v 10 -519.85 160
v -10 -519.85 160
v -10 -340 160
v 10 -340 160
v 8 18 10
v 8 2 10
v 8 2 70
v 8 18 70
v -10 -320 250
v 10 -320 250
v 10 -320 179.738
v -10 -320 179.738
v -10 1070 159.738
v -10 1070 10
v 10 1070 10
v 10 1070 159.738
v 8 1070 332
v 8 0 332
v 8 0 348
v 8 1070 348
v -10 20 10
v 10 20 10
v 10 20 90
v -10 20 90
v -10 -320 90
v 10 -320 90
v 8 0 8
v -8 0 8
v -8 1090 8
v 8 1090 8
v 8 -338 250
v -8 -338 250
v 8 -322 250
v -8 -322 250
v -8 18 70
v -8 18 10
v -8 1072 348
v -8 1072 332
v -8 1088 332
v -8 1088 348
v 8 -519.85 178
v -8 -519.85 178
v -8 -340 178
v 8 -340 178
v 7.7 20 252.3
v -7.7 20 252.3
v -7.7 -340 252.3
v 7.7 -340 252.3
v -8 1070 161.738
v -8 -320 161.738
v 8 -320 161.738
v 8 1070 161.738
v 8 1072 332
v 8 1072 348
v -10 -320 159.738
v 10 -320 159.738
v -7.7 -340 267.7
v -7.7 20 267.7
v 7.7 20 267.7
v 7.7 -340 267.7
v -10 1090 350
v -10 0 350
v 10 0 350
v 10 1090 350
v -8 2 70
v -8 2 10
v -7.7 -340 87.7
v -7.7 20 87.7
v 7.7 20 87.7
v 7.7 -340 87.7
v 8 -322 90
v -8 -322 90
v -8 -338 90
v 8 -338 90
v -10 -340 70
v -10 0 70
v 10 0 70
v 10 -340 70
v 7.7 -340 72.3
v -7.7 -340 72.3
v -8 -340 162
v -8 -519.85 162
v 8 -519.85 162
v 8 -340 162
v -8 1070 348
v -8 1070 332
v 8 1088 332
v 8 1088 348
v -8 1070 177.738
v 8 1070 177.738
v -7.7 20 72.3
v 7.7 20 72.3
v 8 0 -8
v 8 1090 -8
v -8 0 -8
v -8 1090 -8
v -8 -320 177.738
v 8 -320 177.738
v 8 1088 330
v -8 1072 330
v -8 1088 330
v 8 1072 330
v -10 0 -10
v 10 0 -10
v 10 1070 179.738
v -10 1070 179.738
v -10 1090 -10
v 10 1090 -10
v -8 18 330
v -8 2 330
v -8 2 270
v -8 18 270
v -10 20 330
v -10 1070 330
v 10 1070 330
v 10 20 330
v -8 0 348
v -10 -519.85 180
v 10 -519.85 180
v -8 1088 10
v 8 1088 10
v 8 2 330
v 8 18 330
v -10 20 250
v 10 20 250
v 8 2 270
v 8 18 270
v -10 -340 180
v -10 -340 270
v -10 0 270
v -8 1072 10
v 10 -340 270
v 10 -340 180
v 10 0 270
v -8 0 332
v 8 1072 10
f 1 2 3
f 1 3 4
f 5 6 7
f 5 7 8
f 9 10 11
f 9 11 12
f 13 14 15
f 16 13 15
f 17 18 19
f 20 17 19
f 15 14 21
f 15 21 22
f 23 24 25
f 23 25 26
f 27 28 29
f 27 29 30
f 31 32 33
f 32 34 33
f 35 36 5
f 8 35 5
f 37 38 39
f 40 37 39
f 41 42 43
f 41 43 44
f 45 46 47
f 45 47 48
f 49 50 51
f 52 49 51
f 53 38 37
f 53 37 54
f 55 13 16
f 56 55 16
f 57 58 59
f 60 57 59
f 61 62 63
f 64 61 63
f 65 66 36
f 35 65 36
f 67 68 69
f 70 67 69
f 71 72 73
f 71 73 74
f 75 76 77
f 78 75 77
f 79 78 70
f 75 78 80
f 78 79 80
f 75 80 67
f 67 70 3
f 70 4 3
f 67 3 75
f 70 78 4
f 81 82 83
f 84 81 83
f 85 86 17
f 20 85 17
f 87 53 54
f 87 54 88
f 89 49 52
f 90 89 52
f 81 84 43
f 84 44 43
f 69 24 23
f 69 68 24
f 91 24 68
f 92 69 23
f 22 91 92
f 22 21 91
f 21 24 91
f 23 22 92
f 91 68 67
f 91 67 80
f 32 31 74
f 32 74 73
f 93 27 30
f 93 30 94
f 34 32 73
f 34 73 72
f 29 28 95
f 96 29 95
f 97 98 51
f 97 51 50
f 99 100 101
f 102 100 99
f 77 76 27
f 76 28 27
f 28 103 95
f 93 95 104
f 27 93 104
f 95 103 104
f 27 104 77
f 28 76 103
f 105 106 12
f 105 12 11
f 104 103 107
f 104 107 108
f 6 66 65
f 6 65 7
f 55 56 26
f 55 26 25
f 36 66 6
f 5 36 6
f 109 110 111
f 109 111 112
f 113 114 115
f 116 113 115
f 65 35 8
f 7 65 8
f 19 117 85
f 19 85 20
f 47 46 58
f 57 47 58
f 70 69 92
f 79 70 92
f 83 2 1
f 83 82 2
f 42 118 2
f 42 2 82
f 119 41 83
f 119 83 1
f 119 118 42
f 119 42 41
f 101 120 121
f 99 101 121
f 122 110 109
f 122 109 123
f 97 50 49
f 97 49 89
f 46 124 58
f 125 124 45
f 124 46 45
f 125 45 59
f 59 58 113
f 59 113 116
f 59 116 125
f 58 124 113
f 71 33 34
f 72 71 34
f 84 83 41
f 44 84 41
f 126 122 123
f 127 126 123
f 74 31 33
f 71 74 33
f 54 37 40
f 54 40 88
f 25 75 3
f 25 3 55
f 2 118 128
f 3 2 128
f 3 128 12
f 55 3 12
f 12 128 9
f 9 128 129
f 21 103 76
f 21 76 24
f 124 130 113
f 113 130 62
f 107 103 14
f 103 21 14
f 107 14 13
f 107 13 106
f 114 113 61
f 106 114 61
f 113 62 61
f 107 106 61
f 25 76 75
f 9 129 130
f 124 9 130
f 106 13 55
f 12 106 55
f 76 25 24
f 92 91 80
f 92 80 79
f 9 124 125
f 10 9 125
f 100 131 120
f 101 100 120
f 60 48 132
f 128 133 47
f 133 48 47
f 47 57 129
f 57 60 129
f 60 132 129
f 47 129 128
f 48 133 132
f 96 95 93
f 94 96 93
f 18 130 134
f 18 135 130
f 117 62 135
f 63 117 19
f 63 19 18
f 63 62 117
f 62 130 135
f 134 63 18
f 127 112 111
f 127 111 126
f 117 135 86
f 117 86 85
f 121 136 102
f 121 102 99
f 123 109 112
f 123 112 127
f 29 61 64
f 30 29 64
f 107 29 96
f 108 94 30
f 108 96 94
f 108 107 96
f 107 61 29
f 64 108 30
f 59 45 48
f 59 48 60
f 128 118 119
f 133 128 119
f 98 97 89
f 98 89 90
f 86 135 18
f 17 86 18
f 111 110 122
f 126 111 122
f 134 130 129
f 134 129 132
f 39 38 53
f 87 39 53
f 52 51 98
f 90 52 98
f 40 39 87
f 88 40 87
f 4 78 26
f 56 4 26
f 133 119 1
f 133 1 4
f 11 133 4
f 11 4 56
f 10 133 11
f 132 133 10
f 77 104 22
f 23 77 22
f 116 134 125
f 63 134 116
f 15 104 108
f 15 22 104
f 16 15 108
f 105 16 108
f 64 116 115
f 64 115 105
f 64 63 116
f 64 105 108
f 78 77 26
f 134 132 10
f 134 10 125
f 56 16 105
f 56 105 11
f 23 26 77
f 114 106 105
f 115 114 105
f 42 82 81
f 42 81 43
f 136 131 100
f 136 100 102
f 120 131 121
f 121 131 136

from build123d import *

# Parameters (mm, degrees)
SKETCH1_W           = 2
SKETCH1_H           = 2
SKETCH1_W_2         = 1.6
SKETCH1_H_2         = 1.6
BOSS_EXTRUDE1_DEPTH = 109
SKETCH2_W           = 2
SKETCH2_H           = 2
SKETCH2_W_2         = 1.6
SKETCH2_H_2         = 1.6
BOSS_EXTRUDE2_DEPTH = 34
SKETCH3_W           = 2
SKETCH3_H           = 2
SKETCH3_W_2         = 1.6
SKETCH3_H_2         = 1.6
BOSS_EXTRUDE3_DEPTH = 6
SKETCH7_W           = 2
SKETCH7_H           = 2
SKETCH7_W_2         = 1.54
SKETCH7_H_2         = 1.54
BOSS_EXTRUDE4_DEPTH = 36
BOSS_EXTRUDE5_REACH = 28
SKETCH8_W           = 2
SKETCH8_H           = 2
SKETCH8_W_2         = 1.6
SKETCH8_H_2         = 1.6
SCALE2_SCALE        = 10
BOSS_EXTRUDE6_REACH = 1412
SKETCH9_W           = 20
SKETCH9_H           = 20
SKETCH9_W_2         = 16
SKETCH9_H_2         = 16
SKETCH10_W          = 20
SKETCH10_H          = 20
SKETCH10_W_2        = 16
SKETCH10_H_2        = 16
BOSS_EXTRUDE7_DEPTH = 179.85


with BuildPart() as part:
    # Sketch1 → Boss-Extrude1 (new body)
    with BuildSketch(Plane(origin=(0, 0, 0), x_dir=(1, 0, 0), z_dir=(0, 1, 0))):
        Rectangle(SKETCH1_W, SKETCH1_H)
        Rectangle(SKETCH1_W_2, SKETCH1_H_2, mode=Mode.SUBTRACT)
    boss_extrude1 = extrude(amount=BOSS_EXTRUDE1_DEPTH)

    # Sketch2 → Boss-Extrude2 (add)
    with BuildSketch(Plane.XY.offset(1)):
        with Locations((0, 108)):
            Rectangle(SKETCH2_W, SKETCH2_H)
        with Locations((0, 108)):
            Rectangle(SKETCH2_W_2, SKETCH2_H_2, mode=Mode.SUBTRACT)
    extrude(amount=BOSS_EXTRUDE2_DEPTH)

    # Mirror1: Boss-Extrude1 across plane
    add(boss_extrude1.mirror(Plane.XY.offset(17)))

    # Sketch3 → Boss-Extrude3 (add)
    with BuildSketch(Plane.XY.offset(1)):
        with Locations((0, 1)):
            Rectangle(SKETCH3_W, SKETCH3_H)
        with Locations((0, 1)):
            Rectangle(SKETCH3_W_2, SKETCH3_H_2, mode=Mode.SUBTRACT)
    boss_extrude3 = extrude(amount=BOSS_EXTRUDE3_DEPTH)

    # Sketch7 → Boss-Extrude4 (add)
    with BuildSketch(Plane(origin=(0, 2, 0), x_dir=(1, 0, 0), z_dir=(0, 1, 0))):
        with Locations((0, -8)):
            Rectangle(SKETCH7_W, SKETCH7_H)
        with Locations((0, -8)):
            Rectangle(SKETCH7_W_2, SKETCH7_H_2, mode=Mode.SUBTRACT)
    boss_extrude4 = extrude(amount=-BOSS_EXTRUDE4_DEPTH)

    # Mirror2: Boss-Extrude3, Boss-Extrude4 across plane
    add(boss_extrude3.mirror(Plane.XY.offset(17)))
    add(boss_extrude4.mirror(Plane.XY.offset(17)))

    # Sketch8 → Boss-Extrude5 (add, up to next)
    with BuildSketch(Plane(origin=(0, 0, 25), x_dir=(-1, 0, 0), z_dir=(0, 0, -1)), mode=Mode.PRIVATE) as boss_extrude5_sk1:
        with Locations((0, -33)):
            Rectangle(SKETCH8_W, SKETCH8_H)
        with Locations((0, -33)):
            Rectangle(SKETCH8_W_2, SKETCH8_H_2, mode=Mode.SUBTRACT)
    boss_extrude5_tool1 = extrude(boss_extrude5_sk1.sketch, amount=BOSS_EXTRUDE5_REACH, mode=Mode.PRIVATE) - part.part
    add(boss_extrude5_tool1.solids().sort_by_distance((0, -32.028284, 25))[0])


with BuildPart() as part_1:
    # Scale2: scaled about (0, 0, 0)
    add(part.part.scale(SCALE2_SCALE))

    # Sketch9 → Boss-Extrude6 (add, up to next)
    with BuildSketch(Plane.XZ.offset(-1070), mode=Mode.PRIVATE) as boss_extrude6_sk1:
        with Locations((0, 169.738105544)):
            Rectangle(SKETCH9_W, SKETCH9_H)
        with Locations((0, 169.738105544)):
            Rectangle(SKETCH9_W_2, SKETCH9_H_2, mode=Mode.SUBTRACT)
    boss_extrude6_tool1 = extrude(boss_extrude6_sk1.sketch, amount=BOSS_EXTRUDE6_REACH, mode=Mode.PRIVATE) - part_1.part
    add(boss_extrude6_tool1.solids().sort_by_distance((0, 1070, 179.455263))[0])

    # Sketch10 → Boss-Extrude7 (add)
    with BuildSketch(Plane.XZ.offset(340)):
        with Locations((0, 170)):
            Rectangle(SKETCH10_W, SKETCH10_H)
        with Locations((0, 170)):
            Rectangle(SKETCH10_W_2, SKETCH10_H_2, mode=Mode.SUBTRACT)
    extrude(amount=BOSS_EXTRUDE7_DEPTH)


solid = part_1.part
